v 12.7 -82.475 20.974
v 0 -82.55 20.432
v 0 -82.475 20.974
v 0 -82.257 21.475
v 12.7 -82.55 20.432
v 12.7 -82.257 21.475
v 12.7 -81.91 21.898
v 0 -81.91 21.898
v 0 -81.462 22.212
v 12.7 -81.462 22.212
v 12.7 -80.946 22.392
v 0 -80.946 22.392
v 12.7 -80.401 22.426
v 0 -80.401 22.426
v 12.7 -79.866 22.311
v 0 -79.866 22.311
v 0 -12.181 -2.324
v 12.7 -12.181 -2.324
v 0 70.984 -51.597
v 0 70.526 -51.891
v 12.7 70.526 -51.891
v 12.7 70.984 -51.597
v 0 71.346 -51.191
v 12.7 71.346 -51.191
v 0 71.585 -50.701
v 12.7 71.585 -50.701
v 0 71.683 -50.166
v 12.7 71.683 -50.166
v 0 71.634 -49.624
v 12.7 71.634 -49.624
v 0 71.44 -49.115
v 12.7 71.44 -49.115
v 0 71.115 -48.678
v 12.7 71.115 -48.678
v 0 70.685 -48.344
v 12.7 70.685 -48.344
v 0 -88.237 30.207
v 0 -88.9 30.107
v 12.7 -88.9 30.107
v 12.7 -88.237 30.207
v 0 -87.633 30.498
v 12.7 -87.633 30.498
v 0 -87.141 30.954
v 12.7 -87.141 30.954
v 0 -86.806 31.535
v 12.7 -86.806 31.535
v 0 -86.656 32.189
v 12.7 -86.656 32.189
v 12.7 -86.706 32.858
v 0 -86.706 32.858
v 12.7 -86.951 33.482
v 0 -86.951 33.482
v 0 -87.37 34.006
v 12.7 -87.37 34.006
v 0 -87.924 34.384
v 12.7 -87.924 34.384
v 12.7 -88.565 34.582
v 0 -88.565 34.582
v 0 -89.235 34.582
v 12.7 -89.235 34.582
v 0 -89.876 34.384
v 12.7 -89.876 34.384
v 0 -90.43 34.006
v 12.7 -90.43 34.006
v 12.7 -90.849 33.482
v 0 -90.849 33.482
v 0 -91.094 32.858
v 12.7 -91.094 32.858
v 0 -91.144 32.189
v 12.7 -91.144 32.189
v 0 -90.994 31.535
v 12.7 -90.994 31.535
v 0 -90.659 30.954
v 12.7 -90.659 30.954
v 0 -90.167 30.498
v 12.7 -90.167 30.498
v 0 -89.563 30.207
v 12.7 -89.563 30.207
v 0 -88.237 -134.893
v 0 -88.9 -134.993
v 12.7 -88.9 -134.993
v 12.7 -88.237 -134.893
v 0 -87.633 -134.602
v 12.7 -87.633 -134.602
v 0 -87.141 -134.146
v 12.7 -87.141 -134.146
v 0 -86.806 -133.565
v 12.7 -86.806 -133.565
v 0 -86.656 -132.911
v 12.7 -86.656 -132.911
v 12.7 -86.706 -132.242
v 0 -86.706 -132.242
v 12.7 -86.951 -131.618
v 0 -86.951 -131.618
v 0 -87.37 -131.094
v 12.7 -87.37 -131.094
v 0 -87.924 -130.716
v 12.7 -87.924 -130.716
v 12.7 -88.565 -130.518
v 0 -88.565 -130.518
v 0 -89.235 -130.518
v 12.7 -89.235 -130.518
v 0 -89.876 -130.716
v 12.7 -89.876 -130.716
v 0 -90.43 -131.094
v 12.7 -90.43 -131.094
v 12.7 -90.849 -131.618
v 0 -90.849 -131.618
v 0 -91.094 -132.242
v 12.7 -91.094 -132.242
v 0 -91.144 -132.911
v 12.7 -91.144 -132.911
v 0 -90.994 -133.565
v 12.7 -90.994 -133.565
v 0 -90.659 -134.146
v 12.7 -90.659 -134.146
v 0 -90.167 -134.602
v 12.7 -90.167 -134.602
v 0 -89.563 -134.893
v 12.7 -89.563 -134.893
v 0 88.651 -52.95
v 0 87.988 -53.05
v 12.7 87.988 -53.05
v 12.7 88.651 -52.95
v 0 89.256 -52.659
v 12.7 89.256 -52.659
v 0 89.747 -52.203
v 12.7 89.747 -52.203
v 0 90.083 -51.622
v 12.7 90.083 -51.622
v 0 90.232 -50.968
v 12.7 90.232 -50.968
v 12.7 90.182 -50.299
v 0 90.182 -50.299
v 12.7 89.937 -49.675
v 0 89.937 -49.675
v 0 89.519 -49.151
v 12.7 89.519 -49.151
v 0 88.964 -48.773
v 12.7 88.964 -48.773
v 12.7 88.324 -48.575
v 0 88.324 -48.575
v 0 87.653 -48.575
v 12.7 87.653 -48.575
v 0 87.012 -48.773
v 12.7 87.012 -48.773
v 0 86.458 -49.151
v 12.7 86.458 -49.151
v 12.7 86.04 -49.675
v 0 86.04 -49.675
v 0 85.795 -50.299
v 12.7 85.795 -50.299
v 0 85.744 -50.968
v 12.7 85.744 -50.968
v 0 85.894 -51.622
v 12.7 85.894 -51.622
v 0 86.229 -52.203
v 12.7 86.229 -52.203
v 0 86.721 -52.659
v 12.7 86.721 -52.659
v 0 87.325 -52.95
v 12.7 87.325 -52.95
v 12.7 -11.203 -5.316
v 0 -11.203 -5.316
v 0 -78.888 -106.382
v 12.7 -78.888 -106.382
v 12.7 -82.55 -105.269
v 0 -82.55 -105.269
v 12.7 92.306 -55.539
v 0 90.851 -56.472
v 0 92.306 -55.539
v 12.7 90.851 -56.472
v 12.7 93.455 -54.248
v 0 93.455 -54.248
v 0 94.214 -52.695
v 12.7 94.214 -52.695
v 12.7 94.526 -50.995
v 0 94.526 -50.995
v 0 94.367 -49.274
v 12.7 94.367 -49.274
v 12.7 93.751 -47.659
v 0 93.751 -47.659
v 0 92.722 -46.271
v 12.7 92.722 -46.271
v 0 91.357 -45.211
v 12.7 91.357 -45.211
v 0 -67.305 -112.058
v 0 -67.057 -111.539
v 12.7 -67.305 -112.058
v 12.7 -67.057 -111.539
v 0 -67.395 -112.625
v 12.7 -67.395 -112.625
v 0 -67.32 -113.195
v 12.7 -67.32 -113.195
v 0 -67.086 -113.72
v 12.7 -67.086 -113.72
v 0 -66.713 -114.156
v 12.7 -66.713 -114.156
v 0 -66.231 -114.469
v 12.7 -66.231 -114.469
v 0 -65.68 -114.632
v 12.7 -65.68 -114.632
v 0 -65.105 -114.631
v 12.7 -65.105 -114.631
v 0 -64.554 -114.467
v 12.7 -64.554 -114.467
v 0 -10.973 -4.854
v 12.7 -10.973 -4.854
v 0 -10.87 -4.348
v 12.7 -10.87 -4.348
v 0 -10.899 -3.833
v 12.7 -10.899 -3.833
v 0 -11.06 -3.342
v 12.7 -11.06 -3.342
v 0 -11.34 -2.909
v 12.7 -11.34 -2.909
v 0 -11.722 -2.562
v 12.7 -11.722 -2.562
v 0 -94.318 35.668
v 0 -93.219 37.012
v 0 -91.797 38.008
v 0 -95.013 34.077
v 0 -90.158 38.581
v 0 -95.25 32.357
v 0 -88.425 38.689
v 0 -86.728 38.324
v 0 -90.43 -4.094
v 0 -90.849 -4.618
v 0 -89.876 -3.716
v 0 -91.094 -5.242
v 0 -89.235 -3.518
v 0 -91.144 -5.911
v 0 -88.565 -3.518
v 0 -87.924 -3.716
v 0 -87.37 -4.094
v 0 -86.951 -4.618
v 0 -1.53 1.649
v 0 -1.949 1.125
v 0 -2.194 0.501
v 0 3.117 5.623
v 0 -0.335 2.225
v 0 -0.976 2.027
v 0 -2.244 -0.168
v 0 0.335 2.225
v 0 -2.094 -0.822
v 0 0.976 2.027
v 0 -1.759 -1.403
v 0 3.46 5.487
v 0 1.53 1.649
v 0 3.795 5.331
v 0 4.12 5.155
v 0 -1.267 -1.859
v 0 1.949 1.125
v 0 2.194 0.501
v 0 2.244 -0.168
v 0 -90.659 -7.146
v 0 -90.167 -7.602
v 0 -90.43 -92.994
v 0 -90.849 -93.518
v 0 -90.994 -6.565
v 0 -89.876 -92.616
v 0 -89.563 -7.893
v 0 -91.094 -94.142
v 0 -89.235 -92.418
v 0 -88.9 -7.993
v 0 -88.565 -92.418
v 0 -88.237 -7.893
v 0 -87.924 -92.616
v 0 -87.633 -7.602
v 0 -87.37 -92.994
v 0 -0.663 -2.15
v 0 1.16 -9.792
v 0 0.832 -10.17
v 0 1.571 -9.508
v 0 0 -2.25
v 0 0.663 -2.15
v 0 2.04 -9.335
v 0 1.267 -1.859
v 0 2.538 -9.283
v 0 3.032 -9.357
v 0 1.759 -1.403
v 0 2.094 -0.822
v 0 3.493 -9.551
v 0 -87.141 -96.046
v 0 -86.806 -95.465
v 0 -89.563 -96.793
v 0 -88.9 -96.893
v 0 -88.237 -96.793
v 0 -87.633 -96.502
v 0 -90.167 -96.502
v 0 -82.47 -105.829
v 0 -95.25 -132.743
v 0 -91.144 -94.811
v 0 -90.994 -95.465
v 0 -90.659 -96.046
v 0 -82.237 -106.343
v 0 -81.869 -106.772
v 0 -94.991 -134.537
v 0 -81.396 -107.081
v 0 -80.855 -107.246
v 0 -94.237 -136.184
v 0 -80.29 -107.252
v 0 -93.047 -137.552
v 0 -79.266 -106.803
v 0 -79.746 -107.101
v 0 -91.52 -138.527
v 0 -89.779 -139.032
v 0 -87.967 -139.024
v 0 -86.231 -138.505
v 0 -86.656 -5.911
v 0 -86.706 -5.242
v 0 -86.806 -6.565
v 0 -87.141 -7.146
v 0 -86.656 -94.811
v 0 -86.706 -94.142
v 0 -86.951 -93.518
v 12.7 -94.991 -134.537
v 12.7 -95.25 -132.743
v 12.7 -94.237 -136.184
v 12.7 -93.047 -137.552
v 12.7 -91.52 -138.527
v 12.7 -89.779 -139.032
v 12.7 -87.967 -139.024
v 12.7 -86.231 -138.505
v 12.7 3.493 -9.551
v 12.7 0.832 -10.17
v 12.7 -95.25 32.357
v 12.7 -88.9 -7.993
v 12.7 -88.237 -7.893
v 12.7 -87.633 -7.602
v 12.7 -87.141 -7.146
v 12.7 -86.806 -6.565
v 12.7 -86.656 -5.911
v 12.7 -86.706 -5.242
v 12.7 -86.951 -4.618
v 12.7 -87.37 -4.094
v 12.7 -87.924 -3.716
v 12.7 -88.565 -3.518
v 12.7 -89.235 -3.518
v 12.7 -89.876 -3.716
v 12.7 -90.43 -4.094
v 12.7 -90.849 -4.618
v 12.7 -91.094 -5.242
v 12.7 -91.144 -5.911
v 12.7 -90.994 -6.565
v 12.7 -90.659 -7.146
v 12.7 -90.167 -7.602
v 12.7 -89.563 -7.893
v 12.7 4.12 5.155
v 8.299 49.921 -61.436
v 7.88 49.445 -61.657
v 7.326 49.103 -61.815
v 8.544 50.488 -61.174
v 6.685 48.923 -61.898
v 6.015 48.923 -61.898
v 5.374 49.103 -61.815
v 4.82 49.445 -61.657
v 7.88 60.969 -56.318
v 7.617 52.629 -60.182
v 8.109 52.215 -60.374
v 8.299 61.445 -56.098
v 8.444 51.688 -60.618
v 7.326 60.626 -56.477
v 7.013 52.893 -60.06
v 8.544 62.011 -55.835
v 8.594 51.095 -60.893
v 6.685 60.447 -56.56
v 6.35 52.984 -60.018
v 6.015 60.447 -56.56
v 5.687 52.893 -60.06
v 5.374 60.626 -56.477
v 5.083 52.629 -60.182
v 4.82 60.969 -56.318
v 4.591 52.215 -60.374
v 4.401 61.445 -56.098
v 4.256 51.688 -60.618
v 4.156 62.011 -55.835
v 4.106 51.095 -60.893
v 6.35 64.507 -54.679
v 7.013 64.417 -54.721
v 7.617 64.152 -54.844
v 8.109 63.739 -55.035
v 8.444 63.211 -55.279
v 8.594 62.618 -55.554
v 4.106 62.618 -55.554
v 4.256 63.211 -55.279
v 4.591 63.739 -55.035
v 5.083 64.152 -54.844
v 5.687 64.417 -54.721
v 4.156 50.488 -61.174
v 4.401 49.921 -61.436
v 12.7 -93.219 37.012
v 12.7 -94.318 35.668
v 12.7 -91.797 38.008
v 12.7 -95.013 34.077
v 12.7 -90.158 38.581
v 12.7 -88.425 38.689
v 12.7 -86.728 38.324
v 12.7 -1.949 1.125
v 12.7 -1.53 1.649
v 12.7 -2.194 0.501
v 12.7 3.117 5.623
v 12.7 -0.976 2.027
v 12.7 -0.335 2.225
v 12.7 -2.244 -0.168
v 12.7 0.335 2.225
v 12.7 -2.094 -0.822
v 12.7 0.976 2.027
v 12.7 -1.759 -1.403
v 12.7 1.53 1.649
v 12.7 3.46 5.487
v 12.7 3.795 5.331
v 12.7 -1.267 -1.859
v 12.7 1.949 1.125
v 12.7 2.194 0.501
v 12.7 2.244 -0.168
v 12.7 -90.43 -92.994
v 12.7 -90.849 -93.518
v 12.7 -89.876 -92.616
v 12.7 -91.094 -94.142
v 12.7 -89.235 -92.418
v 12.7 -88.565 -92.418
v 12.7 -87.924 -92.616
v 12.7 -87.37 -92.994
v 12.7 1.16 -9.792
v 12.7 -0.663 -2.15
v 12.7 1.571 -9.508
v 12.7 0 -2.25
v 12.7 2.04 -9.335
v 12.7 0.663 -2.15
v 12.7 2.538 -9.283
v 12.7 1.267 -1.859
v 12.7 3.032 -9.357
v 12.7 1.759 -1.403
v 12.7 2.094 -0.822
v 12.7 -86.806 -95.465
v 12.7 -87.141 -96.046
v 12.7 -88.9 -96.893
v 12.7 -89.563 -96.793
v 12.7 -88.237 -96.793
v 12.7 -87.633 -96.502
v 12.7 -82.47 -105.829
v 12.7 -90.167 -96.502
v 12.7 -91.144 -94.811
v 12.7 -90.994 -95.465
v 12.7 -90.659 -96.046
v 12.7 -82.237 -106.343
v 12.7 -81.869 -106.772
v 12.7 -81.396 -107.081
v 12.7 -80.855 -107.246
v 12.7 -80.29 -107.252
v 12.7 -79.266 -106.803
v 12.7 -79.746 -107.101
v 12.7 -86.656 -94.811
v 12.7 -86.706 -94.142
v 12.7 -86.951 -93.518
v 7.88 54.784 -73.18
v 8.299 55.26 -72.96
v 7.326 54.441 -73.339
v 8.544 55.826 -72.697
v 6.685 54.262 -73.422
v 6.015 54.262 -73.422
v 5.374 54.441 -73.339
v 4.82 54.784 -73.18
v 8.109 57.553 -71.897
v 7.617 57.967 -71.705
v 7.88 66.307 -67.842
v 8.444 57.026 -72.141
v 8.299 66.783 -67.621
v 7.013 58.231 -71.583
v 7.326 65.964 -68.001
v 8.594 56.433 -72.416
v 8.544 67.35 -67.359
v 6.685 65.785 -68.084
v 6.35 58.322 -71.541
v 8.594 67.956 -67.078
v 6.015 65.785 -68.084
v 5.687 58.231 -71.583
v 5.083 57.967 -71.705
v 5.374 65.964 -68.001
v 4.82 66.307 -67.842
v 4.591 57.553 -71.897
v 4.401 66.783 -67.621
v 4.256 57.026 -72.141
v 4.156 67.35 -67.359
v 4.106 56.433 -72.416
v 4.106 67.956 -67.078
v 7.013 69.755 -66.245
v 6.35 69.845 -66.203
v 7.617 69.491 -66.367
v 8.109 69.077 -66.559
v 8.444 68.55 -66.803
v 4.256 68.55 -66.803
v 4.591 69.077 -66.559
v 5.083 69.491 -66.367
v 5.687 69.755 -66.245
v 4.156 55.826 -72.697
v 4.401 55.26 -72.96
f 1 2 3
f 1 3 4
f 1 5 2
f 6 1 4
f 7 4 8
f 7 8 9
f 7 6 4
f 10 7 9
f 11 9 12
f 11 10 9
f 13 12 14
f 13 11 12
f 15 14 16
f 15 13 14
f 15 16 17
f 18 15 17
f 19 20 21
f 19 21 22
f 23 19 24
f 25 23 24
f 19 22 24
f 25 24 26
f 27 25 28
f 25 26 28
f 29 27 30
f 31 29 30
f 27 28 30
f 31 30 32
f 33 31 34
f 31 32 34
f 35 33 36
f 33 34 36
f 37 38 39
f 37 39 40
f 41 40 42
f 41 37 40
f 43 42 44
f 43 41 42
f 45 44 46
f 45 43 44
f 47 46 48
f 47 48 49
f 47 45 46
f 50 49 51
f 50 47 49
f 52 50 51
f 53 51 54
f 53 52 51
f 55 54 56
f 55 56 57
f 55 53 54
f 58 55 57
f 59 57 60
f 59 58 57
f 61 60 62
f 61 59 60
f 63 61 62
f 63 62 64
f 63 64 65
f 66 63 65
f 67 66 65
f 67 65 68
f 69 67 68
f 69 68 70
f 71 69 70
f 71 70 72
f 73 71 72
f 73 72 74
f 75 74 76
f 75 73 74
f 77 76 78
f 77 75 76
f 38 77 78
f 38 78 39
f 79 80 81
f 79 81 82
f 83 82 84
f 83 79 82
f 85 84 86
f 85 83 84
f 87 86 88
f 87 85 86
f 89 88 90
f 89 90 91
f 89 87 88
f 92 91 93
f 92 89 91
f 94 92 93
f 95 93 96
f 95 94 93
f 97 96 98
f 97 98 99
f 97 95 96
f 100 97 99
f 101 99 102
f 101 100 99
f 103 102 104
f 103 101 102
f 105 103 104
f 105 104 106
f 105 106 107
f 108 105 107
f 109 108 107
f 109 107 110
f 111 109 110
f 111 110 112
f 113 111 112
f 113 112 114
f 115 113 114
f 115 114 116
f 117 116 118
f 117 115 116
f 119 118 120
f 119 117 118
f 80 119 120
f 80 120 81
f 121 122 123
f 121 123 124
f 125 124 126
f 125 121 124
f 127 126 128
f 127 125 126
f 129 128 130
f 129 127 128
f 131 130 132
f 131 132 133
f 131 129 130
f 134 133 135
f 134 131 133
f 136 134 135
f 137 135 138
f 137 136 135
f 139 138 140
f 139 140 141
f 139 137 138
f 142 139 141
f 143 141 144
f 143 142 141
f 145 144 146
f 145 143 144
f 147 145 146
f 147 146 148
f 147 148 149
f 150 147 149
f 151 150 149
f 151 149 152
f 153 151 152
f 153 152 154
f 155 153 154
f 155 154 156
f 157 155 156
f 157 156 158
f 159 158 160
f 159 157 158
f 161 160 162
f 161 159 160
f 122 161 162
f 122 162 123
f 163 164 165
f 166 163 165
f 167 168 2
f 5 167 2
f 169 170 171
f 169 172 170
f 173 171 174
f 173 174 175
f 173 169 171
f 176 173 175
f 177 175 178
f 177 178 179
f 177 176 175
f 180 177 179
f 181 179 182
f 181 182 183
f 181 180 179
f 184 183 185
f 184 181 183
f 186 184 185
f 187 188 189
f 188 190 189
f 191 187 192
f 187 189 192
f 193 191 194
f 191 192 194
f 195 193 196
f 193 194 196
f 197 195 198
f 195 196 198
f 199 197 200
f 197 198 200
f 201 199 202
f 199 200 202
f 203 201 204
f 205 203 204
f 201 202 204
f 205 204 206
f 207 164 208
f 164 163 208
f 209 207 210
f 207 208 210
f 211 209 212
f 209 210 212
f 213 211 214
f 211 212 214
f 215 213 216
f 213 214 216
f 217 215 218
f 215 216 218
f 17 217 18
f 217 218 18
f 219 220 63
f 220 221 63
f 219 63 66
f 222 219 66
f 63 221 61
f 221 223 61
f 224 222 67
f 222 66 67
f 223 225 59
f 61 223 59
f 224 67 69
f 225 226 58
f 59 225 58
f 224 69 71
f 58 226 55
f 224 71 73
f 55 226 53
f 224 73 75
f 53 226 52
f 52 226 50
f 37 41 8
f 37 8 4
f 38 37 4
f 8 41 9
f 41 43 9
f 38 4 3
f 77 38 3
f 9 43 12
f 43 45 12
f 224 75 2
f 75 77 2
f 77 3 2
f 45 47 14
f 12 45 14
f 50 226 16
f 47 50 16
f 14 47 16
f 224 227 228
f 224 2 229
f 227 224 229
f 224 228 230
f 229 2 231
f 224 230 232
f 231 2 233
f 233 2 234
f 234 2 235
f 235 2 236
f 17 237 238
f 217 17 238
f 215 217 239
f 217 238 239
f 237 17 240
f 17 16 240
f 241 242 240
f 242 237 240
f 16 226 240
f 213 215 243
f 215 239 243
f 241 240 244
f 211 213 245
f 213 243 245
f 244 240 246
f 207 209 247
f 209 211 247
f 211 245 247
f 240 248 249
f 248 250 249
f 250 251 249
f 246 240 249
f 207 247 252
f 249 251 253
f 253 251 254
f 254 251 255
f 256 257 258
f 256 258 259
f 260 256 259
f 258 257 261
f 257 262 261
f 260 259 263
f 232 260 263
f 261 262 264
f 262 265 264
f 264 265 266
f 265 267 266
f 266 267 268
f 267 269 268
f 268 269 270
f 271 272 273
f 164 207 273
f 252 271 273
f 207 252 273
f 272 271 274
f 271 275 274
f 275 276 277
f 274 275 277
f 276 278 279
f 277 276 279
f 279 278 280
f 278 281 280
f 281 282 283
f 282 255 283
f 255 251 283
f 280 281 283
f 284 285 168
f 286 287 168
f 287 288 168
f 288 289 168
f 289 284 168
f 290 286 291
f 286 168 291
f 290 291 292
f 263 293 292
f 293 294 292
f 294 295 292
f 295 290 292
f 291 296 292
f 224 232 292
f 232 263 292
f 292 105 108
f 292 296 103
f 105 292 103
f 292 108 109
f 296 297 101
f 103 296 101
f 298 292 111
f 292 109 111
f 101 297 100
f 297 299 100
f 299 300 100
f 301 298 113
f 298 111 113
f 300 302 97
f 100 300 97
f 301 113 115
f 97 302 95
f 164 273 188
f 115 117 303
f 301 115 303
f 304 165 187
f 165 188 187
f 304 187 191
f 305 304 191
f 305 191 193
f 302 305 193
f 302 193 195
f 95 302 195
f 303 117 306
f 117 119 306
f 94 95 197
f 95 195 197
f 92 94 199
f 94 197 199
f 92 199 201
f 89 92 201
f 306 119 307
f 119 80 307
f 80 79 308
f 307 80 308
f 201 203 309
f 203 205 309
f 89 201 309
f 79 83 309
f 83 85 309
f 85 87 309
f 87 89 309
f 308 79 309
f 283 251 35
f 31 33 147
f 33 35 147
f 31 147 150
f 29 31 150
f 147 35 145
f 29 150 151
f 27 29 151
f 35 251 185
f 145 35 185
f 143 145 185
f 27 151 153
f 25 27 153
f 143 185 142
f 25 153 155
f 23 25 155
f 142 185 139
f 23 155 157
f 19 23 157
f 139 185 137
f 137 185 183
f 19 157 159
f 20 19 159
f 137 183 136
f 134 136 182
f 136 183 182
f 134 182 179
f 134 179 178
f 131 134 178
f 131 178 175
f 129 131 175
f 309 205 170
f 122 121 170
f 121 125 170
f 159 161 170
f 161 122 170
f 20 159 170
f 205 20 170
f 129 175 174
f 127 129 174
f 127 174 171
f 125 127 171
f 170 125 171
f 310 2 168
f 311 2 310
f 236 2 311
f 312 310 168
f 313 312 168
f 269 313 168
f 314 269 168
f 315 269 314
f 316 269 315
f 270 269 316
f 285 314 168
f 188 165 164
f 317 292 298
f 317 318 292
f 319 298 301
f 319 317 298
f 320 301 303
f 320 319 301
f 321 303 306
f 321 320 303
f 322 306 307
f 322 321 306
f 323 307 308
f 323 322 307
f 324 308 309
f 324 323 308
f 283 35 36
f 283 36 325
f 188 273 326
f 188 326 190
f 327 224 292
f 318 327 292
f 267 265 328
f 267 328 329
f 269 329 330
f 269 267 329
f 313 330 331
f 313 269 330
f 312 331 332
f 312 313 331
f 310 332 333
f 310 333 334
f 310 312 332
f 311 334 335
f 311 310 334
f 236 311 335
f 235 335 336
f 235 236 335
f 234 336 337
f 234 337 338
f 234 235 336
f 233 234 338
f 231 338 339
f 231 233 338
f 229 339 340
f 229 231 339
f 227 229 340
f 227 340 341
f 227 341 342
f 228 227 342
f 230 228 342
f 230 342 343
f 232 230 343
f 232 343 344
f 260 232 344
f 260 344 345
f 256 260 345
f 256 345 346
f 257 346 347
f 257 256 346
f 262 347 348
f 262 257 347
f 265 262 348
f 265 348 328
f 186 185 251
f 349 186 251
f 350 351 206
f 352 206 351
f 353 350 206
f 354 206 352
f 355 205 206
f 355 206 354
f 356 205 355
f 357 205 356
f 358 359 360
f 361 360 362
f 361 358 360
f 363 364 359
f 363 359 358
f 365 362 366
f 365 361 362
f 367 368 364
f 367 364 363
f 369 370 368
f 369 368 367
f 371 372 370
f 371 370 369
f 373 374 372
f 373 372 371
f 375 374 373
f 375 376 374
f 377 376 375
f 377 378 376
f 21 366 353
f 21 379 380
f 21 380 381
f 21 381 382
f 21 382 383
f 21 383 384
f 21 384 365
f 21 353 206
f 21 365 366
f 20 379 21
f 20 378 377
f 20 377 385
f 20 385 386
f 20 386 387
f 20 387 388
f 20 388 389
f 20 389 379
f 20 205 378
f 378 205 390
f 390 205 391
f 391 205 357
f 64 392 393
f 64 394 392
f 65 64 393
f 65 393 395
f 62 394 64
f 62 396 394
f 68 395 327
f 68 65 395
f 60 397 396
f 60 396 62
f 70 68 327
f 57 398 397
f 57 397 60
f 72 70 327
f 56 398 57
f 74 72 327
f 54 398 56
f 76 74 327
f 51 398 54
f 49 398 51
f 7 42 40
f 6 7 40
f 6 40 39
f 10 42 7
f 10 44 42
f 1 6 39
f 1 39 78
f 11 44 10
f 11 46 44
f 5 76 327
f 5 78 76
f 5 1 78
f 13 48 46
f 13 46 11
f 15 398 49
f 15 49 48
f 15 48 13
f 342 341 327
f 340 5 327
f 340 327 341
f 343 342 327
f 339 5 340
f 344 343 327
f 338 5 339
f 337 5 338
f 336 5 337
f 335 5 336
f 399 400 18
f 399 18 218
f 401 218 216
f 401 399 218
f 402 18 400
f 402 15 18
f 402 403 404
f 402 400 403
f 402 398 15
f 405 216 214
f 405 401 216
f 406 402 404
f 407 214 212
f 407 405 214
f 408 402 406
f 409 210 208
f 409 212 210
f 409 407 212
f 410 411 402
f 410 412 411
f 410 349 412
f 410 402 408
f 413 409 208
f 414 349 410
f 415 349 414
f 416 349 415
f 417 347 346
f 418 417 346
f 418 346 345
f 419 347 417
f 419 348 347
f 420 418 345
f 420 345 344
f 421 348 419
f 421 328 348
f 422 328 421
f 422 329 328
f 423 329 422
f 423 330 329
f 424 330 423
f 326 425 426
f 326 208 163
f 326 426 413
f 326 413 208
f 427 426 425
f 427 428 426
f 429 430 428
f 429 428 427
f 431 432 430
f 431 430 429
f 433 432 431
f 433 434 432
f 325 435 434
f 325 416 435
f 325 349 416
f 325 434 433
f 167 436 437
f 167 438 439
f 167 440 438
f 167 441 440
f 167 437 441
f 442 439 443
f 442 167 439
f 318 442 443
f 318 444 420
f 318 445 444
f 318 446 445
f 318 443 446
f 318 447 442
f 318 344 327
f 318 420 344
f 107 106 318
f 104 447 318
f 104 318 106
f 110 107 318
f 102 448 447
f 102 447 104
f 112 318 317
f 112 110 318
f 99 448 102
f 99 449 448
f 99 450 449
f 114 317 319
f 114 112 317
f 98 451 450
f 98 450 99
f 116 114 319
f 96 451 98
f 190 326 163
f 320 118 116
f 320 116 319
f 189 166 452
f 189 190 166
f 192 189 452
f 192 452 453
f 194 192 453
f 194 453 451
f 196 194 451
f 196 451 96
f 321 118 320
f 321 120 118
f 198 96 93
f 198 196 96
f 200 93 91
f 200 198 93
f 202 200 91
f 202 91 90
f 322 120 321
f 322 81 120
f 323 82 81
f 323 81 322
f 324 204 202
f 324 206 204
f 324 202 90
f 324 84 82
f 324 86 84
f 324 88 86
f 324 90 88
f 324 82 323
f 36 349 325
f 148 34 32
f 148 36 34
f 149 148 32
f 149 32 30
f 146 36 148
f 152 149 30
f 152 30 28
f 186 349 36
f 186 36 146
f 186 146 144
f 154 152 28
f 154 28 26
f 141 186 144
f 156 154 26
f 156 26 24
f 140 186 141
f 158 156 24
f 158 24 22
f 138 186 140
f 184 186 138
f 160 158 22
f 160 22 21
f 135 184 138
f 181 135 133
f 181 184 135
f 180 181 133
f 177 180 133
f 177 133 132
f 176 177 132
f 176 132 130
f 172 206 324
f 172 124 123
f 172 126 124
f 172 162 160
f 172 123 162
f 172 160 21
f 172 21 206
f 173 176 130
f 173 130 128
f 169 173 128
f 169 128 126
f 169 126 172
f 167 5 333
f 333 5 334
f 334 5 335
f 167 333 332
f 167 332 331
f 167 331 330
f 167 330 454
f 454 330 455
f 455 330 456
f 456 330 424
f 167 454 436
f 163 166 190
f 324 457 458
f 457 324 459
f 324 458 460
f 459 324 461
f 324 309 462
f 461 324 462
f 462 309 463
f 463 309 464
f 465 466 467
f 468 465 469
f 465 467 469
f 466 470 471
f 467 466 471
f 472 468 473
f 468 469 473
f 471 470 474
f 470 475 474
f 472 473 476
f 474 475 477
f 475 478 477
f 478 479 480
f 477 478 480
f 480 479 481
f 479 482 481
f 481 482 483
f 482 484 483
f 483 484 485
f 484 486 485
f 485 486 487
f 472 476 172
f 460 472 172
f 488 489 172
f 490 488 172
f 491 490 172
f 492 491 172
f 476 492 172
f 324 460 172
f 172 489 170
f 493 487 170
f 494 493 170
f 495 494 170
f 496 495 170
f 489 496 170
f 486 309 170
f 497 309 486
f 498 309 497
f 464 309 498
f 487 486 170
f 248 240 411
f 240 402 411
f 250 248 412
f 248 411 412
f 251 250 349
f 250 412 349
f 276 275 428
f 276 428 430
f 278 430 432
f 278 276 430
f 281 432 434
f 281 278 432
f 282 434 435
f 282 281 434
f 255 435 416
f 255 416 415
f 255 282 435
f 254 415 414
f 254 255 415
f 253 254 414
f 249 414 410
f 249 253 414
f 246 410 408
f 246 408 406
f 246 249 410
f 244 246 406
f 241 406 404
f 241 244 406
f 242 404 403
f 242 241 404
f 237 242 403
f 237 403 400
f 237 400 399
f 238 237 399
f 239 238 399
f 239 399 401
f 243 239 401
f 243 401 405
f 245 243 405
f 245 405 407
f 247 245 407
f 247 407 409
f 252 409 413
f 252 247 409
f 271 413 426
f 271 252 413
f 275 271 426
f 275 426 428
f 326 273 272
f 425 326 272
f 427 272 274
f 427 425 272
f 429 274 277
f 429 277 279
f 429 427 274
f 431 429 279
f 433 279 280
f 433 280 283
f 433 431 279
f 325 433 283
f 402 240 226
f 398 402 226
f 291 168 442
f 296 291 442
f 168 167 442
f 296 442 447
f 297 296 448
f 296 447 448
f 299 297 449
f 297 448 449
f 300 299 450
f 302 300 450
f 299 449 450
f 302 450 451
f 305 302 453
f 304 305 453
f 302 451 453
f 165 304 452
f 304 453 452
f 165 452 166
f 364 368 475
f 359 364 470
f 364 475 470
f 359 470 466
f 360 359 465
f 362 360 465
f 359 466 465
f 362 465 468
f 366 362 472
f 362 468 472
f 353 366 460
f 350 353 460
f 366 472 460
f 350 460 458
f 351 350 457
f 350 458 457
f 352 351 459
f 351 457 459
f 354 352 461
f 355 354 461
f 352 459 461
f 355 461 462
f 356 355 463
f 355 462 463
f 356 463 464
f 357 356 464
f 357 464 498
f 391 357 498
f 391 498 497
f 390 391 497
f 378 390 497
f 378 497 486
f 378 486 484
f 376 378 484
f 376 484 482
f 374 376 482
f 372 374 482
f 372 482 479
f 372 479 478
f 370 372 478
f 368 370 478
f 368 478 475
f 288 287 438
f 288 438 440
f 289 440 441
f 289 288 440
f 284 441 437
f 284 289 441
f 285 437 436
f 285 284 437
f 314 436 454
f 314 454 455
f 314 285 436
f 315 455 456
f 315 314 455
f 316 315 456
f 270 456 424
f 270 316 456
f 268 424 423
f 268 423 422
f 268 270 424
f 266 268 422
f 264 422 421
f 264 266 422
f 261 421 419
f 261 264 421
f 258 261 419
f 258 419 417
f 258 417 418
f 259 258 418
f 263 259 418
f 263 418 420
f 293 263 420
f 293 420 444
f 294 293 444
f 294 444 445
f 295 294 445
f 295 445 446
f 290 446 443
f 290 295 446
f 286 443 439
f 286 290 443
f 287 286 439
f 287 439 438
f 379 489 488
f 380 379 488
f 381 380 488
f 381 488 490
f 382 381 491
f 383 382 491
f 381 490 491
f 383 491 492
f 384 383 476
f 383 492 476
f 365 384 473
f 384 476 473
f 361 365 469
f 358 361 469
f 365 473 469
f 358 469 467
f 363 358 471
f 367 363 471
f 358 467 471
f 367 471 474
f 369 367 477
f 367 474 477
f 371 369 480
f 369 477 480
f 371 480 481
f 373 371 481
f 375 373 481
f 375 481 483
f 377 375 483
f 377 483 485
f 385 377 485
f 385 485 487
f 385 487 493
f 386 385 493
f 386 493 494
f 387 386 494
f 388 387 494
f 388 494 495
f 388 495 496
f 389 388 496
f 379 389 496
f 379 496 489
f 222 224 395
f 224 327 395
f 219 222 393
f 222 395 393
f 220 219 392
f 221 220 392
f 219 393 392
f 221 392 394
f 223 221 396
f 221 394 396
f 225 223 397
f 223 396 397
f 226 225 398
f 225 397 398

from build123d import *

# Parameters (mm, degrees)
SKETCH2_R           = 2.25
BOSS_EXTRUDE1_DEPTH = 12.7
FILLET1_R           = 6.35
FILLET2_R           = 2
CUT_EXTRUDE1_REACH  = 181.366
SKETCH3_R           = 2.25


with BuildPart() as part:
    # Sketch2 → Boss-Extrude1 (new body)
    with BuildSketch(Plane(origin=(0, 0, 0), x_dir=(0, 0, -1), z_dir=(1, 0, 0))):
        Polygon((-41.425693669, -95.25), (142.682929389, -95.25), (51.328891162, 101.953428549), (-5.433161507, 3.638669384), align=None)
        Circle(SKETCH2_R, mode=Mode.SUBTRACT)
        with Locations((50.8, 87.988181024)):
            Circle(SKETCH2_R, mode=Mode.SUBTRACT)
        with Locations((-32.356953826, -88.9)):
            Circle(SKETCH2_R, mode=Mode.SUBTRACT)
        with Locations((132.743046174, -88.9)):
            Circle(SKETCH2_R, mode=Mode.SUBTRACT)
        with Locations((5.743046174, -88.9)):
            Circle(SKETCH2_R, mode=Mode.SUBTRACT)
        with Locations((94.643046174, -88.9)):
            Circle(SKETCH2_R, mode=Mode.SUBTRACT)
        Polygon((-23.288213983, -82.55), (3.196675109, -9.783365262), (111.849821959, -82.55), align=None, mode=Mode.SUBTRACT)
        Polygon((8.615197161, 1.87277804), (117.46426423, -71.025067394), (50.271108838, 74.0229335), align=None, mode=Mode.SUBTRACT)
    extrude(amount=BOSS_EXTRUDE1_DEPTH)

    # Fillet1
    fillet1_edges = [part.edges().sort_by_distance(p)[0] for p in [
        (6.35, 3.638669384, 5.433161507),
        (6.35, 101.953428549, -51.328891162),
        (6.35, -95.25, -142.682929389),
        (6.35, -95.25, 41.425693669),
    ]]
    fillet(fillet1_edges, radius=FILLET1_R)

    # Fillet2
    fillet2_edges = [part.edges().sort_by_distance(p)[0] for p in [
        (6.35, -82.55, 23.288213983),
        (6.35, -82.55, -111.849821959),
        (6.35, -9.783365262, -3.196675109),
        (6.35, 74.0229335, -50.271108838),
        (6.35, 1.87277804, -8.615197161),
        (6.35, -71.025067394, -117.46426423),
    ]]
    fillet(fillet2_edges, radius=FILLET2_R)

    # Sketch3 → Cut-Extrude1 (cut, up to next)
    with BuildSketch(Plane(origin=(0, 37.590233469, -81.144994396), x_dir=(-1, 0, 0), z_dir=(0, 0.4203363295122346, -0.9073683761803595)), mode=Mode.PRIVATE) as cut_extrude1_sk1:
        with Locations(Location((-6.35, 33.298120023, 0), (0, 0, 90))):
            Circle(SKETCH3_R)
    cut_extrude1_tool1 = extrude(cut_extrude1_sk1.sketch, amount=-CUT_EXTRUDE1_REACH, mode=Mode.PRIVATE) & part.part
    # Sketch3 → Cut-Extrude1 (cut, up to next)
    with BuildSketch(Plane(origin=(0, 37.590233469, -81.144994396), x_dir=(-1, 0, 0), z_dir=(0, 0.4203363295122346, -0.9073683761803595)), mode=Mode.PRIVATE) as cut_extrude1_sk2:
        with Locations(Location((-6.35, 20.598120023, 0), (0, 0, 90))):
            Circle(SKETCH3_R)
    cut_extrude1_tool2 = extrude(cut_extrude1_sk2.sketch, amount=-CUT_EXTRUDE1_REACH, mode=Mode.PRIVATE) & part.part
    add(cut_extrude1_tool1.solids().sort_by_distance((6.35, 67.803895, -67.148585))[0], mode=Mode.SUBTRACT)
    add(cut_extrude1_tool2.solids().sort_by_distance((6.35, 56.280316, -72.486856))[0], mode=Mode.SUBTRACT)


solid = part.part
